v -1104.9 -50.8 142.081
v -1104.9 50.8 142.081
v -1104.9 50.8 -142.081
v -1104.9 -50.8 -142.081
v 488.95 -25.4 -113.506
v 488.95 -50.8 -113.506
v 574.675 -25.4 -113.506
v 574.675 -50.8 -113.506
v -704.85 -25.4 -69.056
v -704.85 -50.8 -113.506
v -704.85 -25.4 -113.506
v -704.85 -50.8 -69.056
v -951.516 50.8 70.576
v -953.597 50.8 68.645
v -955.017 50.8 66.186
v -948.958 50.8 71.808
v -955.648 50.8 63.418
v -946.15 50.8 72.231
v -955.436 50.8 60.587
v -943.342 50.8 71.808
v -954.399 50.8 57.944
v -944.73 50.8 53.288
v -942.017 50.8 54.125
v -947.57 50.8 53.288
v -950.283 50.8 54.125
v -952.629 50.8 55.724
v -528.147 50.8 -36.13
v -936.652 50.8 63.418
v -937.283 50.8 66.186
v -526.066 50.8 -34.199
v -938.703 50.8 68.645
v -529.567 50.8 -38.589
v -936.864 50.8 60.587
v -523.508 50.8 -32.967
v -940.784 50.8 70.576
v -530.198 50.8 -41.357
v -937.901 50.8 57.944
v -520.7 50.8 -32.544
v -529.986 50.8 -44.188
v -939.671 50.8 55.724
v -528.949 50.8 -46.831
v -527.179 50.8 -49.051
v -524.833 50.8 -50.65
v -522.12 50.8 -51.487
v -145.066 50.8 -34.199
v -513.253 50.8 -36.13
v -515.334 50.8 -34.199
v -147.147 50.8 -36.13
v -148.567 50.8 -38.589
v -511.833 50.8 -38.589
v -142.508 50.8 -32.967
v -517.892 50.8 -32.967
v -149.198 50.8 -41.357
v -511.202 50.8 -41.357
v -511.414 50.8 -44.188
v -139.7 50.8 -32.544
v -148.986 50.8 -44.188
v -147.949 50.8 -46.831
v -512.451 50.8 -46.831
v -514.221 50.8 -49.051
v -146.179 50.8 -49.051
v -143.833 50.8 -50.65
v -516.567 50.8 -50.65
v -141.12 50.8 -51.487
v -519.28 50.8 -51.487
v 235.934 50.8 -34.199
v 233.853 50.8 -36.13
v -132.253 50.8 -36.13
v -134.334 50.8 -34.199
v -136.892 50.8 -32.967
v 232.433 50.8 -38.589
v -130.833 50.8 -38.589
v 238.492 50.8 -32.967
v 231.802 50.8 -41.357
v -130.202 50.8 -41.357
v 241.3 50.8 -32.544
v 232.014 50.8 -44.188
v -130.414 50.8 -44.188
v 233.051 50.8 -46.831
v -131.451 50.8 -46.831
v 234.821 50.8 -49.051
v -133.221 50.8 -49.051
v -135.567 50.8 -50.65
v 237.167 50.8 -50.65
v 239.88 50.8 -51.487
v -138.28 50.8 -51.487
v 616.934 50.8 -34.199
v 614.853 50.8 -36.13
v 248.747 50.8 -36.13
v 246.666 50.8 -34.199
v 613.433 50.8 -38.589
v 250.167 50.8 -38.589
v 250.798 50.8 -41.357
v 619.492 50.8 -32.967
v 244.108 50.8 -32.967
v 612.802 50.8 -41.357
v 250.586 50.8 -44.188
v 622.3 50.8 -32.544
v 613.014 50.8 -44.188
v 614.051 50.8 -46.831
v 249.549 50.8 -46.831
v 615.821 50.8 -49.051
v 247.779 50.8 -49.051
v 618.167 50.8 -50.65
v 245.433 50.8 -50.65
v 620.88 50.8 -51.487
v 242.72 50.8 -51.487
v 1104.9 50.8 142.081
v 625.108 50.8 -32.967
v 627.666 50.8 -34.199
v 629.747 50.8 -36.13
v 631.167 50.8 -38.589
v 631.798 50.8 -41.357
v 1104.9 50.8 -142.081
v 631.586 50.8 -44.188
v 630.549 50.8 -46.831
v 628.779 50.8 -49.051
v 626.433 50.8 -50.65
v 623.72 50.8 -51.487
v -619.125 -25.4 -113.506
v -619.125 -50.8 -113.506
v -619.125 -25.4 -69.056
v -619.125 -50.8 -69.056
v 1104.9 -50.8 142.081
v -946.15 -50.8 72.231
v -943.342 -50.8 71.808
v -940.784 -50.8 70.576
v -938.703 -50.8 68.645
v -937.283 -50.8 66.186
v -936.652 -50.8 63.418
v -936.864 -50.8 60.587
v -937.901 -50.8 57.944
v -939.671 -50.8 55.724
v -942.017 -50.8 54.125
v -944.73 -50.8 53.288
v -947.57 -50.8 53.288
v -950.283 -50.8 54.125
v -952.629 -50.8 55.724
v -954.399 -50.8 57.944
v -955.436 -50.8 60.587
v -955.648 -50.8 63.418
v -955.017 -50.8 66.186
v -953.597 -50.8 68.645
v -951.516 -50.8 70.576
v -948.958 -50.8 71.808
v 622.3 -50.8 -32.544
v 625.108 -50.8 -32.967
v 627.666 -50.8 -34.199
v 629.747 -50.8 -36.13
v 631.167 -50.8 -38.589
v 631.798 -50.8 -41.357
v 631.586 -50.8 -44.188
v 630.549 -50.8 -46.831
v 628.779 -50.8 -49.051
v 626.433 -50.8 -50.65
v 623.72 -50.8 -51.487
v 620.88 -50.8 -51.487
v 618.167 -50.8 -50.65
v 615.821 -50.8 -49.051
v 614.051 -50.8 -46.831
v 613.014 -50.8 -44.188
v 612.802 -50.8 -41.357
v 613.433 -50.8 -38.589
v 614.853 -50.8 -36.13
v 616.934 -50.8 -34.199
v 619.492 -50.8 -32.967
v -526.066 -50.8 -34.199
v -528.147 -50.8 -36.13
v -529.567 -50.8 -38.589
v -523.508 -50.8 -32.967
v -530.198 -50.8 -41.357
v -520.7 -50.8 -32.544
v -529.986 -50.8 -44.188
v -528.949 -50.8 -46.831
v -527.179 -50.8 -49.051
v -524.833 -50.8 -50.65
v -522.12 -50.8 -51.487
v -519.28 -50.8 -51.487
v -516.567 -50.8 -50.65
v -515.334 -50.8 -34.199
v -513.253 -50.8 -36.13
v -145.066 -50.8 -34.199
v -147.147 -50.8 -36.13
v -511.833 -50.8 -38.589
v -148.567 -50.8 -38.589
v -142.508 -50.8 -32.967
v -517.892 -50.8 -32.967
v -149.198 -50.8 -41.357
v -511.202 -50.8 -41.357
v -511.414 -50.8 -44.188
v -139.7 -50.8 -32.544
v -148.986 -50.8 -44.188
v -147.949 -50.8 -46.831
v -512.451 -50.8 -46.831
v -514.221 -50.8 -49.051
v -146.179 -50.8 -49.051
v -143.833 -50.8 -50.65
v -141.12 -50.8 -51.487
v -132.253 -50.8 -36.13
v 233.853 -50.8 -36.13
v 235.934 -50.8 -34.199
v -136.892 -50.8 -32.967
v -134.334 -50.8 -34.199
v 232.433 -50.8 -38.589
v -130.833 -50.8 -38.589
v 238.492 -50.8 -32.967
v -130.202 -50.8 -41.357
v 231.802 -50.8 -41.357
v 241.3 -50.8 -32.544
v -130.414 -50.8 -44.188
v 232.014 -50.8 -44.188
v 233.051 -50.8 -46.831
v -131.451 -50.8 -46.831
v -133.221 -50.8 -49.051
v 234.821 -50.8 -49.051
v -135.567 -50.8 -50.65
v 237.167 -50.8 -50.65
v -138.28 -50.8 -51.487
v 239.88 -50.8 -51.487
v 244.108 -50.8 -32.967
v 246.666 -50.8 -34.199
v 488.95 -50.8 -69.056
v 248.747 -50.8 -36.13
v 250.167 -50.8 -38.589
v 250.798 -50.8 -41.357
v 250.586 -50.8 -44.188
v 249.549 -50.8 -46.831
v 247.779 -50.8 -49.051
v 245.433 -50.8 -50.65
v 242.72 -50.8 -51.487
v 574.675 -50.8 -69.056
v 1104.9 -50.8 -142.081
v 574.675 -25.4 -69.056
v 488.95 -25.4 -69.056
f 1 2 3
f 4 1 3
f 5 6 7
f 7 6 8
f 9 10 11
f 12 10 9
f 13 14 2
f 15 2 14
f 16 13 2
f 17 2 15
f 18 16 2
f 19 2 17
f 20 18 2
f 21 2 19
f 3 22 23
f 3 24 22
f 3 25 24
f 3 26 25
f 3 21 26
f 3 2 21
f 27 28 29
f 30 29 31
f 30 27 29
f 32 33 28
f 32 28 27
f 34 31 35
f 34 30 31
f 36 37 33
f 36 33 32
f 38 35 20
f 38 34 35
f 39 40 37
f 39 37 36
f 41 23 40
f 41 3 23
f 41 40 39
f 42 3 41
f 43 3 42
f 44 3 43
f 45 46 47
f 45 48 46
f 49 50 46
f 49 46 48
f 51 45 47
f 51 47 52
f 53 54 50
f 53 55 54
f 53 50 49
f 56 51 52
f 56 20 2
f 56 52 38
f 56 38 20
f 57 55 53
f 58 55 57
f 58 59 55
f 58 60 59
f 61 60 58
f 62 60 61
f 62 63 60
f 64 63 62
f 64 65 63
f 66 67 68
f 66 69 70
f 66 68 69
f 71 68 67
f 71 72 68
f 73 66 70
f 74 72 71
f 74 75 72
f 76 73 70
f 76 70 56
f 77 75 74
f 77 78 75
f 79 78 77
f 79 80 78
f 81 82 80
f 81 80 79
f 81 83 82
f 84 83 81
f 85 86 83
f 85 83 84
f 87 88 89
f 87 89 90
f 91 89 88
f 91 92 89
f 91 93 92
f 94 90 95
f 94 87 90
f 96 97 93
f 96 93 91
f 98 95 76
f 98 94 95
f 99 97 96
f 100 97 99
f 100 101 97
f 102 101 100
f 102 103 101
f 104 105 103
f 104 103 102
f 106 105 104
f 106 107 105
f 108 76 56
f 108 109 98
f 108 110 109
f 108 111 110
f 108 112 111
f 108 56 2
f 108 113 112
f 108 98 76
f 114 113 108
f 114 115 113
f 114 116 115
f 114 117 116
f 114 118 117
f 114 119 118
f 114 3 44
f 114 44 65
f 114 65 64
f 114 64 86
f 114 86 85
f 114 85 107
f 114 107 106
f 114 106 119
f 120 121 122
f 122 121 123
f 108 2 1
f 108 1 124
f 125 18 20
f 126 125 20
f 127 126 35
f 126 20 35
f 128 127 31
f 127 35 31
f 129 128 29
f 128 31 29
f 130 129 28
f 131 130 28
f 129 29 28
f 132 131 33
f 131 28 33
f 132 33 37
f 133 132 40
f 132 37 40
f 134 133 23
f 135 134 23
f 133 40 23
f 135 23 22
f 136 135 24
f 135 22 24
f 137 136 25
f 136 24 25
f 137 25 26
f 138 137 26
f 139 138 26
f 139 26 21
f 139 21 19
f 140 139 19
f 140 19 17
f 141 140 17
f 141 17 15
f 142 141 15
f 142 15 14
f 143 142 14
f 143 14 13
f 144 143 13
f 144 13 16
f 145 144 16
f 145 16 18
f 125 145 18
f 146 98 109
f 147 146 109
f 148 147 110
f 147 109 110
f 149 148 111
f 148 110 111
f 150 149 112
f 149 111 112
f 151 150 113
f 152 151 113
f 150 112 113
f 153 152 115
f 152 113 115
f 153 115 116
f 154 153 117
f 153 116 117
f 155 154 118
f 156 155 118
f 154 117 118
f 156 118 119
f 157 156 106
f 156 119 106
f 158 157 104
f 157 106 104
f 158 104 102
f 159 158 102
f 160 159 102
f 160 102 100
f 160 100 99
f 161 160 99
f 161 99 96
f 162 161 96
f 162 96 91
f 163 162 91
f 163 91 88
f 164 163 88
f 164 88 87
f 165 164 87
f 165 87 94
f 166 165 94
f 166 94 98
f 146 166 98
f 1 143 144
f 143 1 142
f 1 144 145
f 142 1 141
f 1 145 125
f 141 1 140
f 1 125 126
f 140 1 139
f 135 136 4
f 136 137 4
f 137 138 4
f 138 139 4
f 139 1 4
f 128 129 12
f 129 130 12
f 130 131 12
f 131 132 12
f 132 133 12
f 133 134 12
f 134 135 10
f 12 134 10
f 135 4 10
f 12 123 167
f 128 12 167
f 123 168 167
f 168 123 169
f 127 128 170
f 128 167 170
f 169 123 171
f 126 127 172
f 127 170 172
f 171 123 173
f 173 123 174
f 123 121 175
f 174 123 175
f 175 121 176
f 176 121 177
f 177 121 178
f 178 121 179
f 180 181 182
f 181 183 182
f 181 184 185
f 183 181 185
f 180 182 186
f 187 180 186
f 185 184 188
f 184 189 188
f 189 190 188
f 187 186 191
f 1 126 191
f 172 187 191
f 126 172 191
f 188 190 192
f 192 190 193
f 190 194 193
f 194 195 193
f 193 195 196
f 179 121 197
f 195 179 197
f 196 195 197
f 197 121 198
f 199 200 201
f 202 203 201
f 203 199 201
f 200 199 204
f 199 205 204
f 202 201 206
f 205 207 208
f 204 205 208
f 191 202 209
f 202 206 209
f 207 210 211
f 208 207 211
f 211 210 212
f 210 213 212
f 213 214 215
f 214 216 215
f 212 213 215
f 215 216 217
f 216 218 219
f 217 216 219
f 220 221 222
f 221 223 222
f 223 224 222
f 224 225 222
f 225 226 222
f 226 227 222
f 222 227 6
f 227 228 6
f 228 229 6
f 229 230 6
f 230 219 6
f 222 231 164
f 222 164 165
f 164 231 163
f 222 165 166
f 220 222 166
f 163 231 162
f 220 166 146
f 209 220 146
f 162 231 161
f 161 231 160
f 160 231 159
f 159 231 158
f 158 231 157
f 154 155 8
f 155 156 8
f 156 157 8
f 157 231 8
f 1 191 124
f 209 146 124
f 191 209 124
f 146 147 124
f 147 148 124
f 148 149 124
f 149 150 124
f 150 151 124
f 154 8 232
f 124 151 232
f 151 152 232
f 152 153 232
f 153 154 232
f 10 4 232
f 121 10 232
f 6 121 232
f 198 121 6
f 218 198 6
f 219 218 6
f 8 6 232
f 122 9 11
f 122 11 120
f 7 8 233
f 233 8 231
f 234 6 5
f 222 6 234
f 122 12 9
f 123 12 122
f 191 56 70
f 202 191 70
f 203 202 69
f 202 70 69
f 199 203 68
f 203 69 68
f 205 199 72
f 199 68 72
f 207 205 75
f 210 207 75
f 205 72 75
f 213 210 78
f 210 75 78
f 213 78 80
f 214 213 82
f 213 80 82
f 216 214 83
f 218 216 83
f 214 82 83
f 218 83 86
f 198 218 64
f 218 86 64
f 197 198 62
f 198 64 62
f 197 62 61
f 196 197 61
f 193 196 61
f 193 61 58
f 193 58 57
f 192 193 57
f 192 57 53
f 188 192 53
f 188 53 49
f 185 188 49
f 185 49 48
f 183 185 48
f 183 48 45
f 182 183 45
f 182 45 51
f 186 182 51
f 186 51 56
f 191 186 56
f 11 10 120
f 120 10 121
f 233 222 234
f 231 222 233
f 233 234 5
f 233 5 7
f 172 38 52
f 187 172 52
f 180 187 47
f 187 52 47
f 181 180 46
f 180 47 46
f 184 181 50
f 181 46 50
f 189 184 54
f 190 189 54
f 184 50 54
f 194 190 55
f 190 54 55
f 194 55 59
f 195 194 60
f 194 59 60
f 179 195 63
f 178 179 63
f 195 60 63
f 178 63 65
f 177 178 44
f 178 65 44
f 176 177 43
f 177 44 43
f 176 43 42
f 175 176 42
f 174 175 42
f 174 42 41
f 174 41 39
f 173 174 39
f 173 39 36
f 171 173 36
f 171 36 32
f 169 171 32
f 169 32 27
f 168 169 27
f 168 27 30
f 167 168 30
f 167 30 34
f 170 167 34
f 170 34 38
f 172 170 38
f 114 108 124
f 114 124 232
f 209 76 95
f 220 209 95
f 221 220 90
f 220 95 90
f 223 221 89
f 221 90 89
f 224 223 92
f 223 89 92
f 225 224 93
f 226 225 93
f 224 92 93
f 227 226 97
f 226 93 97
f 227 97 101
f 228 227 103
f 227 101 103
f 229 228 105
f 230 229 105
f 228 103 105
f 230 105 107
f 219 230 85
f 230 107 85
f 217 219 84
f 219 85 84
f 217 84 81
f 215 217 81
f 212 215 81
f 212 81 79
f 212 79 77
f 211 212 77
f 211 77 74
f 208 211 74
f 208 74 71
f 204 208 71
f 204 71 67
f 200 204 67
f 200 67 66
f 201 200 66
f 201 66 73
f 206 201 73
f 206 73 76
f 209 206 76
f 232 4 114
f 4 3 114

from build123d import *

# Parameters (mm, degrees)
SKETCH1_W           = 2209.8
SKETCH1_H           = 284.1625
BOSS_EXTRUDE1_DEPTH = 50.8
SKETCH2_R           = 9.525
CUT_EXTRUDE1_DEPTH  = 1119.621317337
SKETCH3_W           = 85.725
SKETCH3_H           = 44.45
CUT_EXTRUDE2_DEPTH  = 25.4


with BuildPart() as part:
    # Sketch1 → Boss-Extrude1 (new, symmetric)
    with BuildSketch(Plane(origin=(0, 0, 0), x_dir=(1, 0, 0), z_dir=(0, 1, 0))):
        Rectangle(SKETCH1_W, SKETCH1_H)
    extrude(amount=BOSS_EXTRUDE1_DEPTH, both=True)

    # Sketch2 → Cut-Extrude1 (cut, through all)
    with BuildSketch(Plane(origin=(0, 50.8, 0), x_dir=(1, 0, 0), z_dir=(0, 1, 0))):
        with Locations(Location((-946.15, -62.70625, 0), (0, 0, 270))):
            Circle(SKETCH2_R)
        with Locations(Location((-520.7, 42.06875, 0), (0, 0, 270))):
            Circle(SKETCH2_R)
        with Locations(Location((-139.7, 42.06875, 0), (0, 0, 270))):
            Circle(SKETCH2_R)
        with Locations(Location((241.3, 42.06875, 0), (0, 0, 270))):
            Circle(SKETCH2_R)
        with Locations(Location((622.3, 42.06875, 0), (0, 0, 270))):
            Circle(SKETCH2_R)
    extrude(amount=-CUT_EXTRUDE1_DEPTH, mode=Mode.SUBTRACT)

    # Sketch3 → Cut-Extrude2 (cut)
    with BuildSketch(Plane.XZ.offset(50.8)):
        with Locations((531.8125, -91.28125)):
            Rectangle(SKETCH3_W, SKETCH3_H)
        with Locations((-661.9875, -91.28125)):
            Rectangle(SKETCH3_W, SKETCH3_H)
    extrude(amount=-CUT_EXTRUDE2_DEPTH, mode=Mode.SUBTRACT)


solid = part.part
